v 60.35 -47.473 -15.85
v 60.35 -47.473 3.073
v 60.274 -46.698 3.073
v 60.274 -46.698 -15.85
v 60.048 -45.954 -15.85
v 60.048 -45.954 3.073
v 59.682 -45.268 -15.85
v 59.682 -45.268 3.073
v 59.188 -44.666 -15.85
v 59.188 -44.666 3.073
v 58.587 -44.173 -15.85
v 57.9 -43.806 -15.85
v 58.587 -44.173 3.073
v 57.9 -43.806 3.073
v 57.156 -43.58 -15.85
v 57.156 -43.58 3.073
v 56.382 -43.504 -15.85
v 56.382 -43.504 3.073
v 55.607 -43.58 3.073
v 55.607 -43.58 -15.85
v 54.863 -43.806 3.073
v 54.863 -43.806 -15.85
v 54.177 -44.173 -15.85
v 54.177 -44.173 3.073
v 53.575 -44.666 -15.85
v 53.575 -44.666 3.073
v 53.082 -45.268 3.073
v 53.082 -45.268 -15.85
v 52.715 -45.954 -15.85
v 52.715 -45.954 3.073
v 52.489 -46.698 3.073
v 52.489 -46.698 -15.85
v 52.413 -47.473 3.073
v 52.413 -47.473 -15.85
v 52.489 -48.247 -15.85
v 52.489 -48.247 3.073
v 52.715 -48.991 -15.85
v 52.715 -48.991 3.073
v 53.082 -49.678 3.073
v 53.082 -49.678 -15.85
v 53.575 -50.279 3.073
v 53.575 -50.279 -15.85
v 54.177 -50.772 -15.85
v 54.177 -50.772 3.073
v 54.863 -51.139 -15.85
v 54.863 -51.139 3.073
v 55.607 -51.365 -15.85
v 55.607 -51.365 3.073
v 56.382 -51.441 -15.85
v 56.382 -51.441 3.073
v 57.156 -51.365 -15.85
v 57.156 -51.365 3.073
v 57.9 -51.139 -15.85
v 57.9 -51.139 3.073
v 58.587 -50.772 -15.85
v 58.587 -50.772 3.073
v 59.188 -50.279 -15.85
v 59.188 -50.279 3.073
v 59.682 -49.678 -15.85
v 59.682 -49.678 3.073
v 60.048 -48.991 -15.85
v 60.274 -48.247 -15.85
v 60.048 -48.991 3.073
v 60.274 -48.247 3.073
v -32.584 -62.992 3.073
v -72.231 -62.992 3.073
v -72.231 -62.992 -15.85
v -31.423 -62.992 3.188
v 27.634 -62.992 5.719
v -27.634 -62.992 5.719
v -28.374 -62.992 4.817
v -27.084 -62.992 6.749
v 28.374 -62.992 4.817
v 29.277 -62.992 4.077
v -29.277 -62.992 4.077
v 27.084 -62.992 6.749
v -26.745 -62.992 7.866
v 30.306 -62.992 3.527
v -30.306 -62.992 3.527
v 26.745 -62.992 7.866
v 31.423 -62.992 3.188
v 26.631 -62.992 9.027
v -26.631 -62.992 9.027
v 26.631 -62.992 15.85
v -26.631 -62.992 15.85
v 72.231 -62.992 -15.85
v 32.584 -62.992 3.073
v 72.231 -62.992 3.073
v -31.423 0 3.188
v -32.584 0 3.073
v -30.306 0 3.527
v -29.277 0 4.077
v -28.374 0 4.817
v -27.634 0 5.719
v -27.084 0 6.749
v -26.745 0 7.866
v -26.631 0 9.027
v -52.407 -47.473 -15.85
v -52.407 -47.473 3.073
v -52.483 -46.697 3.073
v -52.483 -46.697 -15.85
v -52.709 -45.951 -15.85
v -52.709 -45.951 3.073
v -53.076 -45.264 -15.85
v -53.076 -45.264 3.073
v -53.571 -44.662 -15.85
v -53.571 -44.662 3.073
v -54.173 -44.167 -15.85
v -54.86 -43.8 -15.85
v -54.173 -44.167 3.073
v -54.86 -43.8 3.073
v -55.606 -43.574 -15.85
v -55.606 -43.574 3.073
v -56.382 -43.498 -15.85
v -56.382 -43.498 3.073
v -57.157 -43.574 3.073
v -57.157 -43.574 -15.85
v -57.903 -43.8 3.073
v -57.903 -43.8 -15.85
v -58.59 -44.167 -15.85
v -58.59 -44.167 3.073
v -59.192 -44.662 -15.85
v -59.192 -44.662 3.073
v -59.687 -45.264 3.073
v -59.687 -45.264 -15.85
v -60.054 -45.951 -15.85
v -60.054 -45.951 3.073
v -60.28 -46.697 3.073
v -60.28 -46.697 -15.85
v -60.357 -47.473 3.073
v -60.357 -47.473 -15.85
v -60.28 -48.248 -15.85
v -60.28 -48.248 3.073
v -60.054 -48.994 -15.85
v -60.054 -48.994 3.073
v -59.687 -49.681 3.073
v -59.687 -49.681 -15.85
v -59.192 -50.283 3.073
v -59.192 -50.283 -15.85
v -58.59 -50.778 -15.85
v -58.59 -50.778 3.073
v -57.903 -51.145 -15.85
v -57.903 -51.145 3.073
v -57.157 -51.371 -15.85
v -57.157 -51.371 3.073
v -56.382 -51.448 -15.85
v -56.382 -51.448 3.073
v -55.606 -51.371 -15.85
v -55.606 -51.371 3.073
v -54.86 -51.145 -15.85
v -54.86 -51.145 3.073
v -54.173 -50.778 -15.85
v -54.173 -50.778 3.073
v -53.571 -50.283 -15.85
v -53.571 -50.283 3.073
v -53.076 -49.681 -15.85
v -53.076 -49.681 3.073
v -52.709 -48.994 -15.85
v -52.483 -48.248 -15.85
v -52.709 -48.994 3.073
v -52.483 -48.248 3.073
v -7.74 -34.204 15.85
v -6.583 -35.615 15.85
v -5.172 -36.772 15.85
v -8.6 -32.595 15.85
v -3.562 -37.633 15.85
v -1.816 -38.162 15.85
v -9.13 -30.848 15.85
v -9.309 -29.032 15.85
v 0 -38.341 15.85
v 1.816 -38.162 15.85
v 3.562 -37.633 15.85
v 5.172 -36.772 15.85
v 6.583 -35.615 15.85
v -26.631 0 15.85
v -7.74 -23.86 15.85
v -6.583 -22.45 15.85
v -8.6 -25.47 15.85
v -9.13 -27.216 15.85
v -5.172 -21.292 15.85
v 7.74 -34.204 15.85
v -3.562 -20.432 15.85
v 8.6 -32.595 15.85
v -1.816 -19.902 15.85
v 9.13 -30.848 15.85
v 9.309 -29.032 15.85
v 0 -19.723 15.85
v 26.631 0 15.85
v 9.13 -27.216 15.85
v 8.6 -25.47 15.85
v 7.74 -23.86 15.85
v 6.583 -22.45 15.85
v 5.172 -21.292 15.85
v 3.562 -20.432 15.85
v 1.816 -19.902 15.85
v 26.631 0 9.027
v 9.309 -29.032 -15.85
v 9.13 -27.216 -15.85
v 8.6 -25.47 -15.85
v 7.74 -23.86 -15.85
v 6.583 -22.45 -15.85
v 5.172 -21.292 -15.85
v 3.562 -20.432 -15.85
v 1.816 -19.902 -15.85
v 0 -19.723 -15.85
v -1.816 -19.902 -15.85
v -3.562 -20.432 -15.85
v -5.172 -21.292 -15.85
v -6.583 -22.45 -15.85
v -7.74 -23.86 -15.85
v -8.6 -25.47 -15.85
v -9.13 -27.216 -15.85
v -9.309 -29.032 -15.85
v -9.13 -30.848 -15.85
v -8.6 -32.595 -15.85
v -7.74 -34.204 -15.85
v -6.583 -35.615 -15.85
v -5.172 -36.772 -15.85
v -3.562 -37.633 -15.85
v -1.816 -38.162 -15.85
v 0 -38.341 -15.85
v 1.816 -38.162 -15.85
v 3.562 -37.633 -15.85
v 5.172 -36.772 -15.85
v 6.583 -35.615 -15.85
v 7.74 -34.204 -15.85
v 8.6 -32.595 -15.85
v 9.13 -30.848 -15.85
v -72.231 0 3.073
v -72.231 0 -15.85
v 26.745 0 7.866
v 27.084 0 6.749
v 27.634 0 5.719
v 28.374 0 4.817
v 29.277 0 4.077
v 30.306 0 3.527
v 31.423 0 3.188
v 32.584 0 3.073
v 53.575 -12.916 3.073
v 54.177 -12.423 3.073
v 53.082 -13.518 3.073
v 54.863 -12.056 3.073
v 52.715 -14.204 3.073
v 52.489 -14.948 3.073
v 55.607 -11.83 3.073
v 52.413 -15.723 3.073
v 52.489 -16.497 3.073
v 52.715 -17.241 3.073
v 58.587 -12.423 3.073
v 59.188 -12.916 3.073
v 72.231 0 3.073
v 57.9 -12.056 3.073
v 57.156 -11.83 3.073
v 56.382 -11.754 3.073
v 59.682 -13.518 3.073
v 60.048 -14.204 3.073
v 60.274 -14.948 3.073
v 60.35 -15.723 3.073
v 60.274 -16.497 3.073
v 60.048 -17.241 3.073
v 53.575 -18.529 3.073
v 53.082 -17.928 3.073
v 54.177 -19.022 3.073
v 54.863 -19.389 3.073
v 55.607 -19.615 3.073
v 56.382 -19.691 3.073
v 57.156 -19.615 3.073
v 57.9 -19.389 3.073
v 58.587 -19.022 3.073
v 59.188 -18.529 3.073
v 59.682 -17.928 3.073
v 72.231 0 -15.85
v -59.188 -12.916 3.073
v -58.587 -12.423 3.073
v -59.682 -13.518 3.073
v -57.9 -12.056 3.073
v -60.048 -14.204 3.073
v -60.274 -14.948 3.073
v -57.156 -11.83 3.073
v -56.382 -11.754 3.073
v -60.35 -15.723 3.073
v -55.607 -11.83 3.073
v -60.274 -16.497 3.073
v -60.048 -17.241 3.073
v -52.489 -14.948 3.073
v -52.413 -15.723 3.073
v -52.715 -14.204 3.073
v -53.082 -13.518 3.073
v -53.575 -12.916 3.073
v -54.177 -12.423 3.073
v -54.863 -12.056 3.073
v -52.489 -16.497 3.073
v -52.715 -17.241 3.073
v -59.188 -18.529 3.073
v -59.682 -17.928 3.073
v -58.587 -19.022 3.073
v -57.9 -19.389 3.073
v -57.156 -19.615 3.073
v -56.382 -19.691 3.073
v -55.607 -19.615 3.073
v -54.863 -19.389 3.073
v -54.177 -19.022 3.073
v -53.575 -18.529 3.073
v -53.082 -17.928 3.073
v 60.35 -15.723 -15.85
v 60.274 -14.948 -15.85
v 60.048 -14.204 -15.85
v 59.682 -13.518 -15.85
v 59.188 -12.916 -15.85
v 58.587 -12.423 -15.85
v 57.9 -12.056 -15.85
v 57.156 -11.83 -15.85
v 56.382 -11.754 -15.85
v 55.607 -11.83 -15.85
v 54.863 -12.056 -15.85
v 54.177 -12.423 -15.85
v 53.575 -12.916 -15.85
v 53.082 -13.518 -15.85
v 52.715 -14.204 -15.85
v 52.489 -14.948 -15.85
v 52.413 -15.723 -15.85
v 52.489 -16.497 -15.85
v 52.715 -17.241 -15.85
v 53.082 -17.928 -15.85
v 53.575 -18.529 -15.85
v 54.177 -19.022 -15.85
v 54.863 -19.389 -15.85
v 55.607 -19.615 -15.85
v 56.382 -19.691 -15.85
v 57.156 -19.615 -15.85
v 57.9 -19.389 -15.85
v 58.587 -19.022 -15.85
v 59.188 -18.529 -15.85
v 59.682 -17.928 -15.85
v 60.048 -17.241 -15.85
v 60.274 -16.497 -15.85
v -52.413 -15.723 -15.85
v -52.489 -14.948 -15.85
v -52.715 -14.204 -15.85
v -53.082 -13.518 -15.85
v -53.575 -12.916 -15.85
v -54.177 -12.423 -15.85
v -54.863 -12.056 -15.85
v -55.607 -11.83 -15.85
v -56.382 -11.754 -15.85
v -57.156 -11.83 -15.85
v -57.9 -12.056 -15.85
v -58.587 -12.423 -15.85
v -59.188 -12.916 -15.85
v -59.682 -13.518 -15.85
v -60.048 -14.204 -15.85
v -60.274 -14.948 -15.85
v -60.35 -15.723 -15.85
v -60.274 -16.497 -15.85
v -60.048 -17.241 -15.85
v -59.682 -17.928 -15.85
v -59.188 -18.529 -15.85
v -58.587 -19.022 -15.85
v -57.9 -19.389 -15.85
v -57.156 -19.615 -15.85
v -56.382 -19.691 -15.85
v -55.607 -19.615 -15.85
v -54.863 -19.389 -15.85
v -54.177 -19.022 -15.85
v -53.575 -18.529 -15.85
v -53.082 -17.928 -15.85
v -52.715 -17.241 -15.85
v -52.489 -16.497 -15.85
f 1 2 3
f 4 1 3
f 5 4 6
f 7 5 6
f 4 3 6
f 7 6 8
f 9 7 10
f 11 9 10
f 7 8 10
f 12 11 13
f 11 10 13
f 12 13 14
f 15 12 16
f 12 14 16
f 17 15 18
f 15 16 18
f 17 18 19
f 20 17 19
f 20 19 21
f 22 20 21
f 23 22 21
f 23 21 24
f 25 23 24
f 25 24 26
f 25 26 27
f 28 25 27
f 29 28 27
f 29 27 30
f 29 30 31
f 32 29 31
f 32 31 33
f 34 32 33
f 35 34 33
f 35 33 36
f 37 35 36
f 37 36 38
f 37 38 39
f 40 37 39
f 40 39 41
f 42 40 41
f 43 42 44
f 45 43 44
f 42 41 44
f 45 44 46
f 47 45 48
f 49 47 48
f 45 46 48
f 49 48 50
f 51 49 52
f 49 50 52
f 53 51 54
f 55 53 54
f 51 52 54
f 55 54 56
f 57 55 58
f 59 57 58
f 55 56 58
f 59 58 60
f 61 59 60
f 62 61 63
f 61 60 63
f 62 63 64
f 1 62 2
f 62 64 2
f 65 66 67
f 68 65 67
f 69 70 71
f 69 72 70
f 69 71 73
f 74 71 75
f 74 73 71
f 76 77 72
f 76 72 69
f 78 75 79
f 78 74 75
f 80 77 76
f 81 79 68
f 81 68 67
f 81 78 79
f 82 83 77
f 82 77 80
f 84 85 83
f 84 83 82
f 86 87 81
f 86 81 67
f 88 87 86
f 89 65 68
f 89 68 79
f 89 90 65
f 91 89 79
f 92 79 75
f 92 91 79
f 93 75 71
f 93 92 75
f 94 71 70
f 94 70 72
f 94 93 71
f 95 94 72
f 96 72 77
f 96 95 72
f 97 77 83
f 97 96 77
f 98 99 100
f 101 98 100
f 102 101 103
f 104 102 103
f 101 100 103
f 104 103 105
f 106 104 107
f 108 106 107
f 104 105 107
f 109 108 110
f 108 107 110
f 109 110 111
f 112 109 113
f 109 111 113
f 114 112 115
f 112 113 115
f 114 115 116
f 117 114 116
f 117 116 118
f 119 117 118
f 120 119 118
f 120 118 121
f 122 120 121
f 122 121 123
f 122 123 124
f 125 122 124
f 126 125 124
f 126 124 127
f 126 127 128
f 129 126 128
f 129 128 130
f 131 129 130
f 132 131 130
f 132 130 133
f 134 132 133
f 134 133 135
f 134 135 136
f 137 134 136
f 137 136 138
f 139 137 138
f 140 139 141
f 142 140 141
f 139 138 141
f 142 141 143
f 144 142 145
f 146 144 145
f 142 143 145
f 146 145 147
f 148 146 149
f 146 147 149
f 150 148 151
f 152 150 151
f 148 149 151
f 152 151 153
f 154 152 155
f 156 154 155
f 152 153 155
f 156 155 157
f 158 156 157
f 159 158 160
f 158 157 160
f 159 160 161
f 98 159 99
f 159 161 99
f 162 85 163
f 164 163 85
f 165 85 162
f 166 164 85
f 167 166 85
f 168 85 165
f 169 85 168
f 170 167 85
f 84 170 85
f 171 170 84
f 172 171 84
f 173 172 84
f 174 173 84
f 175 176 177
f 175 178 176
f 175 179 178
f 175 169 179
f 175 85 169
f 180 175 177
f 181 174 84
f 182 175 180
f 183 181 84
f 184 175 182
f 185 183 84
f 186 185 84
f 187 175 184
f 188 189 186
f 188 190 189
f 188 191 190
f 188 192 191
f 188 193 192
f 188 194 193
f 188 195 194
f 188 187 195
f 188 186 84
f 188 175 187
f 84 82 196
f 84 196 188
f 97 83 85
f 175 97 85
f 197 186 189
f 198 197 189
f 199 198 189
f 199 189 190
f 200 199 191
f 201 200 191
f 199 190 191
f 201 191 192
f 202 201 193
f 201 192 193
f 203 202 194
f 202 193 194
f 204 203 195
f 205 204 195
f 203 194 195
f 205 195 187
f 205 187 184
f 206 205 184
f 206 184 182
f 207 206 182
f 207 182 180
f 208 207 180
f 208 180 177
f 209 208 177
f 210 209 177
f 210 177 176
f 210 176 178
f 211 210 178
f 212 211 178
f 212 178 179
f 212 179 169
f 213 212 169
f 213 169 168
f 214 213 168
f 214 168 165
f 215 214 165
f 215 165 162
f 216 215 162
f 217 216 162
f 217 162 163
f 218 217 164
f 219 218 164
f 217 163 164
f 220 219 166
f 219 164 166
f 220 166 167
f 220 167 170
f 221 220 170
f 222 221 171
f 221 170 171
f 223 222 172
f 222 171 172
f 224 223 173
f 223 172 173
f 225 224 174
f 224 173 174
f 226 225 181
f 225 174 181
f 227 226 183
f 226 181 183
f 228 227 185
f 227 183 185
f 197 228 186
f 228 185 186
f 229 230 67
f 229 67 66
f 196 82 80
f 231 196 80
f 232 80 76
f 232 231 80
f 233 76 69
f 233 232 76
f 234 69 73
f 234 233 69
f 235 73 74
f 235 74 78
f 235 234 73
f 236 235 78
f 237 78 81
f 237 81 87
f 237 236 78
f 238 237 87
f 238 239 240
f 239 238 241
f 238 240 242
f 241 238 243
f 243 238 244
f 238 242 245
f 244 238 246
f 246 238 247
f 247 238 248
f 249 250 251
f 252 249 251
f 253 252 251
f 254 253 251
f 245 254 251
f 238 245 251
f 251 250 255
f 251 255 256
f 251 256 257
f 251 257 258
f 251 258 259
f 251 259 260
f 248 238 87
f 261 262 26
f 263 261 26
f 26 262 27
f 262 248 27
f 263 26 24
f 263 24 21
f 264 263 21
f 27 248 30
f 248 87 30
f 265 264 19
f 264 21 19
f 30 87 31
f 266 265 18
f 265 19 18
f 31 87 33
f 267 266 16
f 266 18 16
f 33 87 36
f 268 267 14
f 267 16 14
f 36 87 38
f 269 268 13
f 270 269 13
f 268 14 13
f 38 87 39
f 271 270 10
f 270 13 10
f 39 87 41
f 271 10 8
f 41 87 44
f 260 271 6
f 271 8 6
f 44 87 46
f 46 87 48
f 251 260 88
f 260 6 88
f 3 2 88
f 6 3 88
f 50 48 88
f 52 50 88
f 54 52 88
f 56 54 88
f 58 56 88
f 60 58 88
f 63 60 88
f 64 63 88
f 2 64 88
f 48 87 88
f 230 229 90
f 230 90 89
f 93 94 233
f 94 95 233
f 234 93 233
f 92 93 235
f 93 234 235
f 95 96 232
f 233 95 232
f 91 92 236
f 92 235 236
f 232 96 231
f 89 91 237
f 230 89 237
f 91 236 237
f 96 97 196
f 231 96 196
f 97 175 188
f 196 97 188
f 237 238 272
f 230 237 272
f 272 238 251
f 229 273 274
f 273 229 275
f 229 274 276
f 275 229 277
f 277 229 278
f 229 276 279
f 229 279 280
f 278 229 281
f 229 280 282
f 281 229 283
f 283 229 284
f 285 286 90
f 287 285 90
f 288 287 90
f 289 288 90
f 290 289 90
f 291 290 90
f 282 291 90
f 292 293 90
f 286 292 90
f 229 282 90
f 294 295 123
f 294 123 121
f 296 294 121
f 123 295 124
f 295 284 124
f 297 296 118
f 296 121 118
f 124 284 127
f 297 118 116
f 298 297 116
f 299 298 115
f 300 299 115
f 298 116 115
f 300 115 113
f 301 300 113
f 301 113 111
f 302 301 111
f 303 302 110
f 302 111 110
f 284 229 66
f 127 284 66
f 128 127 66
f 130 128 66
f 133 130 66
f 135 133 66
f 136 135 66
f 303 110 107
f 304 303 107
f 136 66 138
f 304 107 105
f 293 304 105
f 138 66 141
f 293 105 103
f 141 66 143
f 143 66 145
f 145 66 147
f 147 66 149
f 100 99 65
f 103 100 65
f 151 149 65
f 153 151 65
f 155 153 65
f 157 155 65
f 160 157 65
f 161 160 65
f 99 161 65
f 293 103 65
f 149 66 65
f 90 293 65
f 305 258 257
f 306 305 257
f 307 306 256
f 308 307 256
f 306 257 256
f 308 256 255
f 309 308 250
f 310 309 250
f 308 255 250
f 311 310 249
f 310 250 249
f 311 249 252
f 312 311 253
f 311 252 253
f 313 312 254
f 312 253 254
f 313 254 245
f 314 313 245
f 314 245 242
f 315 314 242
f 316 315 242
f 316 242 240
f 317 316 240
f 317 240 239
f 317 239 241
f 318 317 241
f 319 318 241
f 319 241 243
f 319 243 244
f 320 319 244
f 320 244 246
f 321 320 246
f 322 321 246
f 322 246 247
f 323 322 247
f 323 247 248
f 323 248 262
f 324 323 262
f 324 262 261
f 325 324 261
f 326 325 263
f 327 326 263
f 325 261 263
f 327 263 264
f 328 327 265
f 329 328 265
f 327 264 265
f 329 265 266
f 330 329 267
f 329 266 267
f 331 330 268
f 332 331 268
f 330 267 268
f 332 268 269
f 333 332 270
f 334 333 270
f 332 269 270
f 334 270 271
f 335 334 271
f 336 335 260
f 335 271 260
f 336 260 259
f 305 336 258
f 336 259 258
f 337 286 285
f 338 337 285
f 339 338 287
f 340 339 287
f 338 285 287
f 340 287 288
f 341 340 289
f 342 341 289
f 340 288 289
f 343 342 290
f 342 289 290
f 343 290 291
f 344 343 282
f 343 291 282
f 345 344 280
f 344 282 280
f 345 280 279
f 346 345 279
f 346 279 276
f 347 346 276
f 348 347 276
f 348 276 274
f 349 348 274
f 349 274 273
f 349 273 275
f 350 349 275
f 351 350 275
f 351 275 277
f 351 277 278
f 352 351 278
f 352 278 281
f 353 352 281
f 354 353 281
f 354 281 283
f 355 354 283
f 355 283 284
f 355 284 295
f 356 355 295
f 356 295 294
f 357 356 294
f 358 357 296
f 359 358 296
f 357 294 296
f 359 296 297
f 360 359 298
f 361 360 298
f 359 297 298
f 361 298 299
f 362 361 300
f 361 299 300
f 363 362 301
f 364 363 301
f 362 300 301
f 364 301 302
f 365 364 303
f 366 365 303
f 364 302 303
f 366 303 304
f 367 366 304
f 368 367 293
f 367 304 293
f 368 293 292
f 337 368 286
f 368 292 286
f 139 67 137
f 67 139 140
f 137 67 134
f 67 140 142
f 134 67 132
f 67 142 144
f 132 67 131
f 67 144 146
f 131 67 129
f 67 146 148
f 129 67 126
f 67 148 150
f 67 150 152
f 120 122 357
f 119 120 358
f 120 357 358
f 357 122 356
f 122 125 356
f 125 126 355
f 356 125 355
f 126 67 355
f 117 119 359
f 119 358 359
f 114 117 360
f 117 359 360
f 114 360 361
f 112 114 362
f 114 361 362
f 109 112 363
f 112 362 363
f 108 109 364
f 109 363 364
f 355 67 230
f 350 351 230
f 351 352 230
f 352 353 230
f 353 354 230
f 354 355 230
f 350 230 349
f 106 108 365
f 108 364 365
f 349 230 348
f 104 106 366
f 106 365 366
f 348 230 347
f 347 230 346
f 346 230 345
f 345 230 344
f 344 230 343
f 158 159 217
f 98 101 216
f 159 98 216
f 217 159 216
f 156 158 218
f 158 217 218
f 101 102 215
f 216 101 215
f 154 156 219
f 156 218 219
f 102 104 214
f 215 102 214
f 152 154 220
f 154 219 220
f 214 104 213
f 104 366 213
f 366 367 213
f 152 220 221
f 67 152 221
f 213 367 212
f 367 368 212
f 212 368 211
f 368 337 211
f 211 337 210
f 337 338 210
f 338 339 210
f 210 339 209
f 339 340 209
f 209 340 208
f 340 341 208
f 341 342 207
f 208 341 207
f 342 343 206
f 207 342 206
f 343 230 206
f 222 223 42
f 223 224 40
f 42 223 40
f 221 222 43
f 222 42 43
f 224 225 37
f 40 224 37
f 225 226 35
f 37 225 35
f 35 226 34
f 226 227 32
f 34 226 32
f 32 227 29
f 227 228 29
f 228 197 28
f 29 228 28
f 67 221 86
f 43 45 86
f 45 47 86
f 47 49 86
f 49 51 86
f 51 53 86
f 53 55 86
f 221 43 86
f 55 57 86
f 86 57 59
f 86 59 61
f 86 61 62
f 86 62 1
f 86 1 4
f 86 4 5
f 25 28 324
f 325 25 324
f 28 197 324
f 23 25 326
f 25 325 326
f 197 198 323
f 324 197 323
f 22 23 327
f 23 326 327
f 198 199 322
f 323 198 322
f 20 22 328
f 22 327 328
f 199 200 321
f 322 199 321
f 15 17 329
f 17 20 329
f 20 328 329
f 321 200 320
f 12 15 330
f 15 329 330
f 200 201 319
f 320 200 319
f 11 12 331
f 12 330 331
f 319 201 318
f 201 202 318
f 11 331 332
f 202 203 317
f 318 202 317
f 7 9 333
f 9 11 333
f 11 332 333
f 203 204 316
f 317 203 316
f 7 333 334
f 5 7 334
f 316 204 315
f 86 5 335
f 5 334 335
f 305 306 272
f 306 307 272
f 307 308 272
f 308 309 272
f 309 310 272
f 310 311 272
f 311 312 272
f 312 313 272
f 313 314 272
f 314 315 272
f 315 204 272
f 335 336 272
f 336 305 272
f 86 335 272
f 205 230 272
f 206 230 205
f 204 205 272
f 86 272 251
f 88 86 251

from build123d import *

# Parameters (mm, degrees)
F0_W      = 144.4625
F0_H      = 31.6992
F1_DEPTH  = 62.992
F2_W      = 45.60062
F2_H      = 12.7762
F3_DEPTH  = 62.993
F4_R      = 5.95376
F5_R      = 9.3091
F6_DEPTH  = 31.7002
F7_R      = 3.96875
F7_R_2    = 3.9751
F8_DEPTH  = 18.924
F9_R      = 3.96875
F10_DEPTH = 18.924


with BuildPart() as f1:
    # F0 (on Front) → F1 (new body)
    with BuildSketch(Plane.XZ):
        Rectangle(F0_W, F0_H)
    extrude(amount=F1_DEPTH)

    # F2 (on face) → F3 (cut, through all)
    with BuildSketch(Plane.XZ.offset(62.992)):
        with Locations((-49.43094, 9.4615)):
            Rectangle(F2_W, F2_H)
        with Locations((49.43094, 9.4615)):
            Rectangle(F2_W, F2_H)
    extrude(amount=-F3_DEPTH, mode=Mode.SUBTRACT)

    # F4
    f4_edges = [f1.edges().sort_by_distance(p)[0] for p in [
        (-26.63063, -31.496, 3.0734),
        (26.63063, -31.496, 3.0734),
    ]]
    fillet(f4_edges, radius=F4_R)

    # F5 (on face) → F6 (cut, through all)
    with BuildSketch(Plane.XY.offset(15.8496)):
        with Locations((0, -29.0322)):
            Circle(F5_R)
    extrude(amount=-F6_DEPTH, mode=Mode.SUBTRACT)

    # F7 (on face) → F8 (cut, through all)
    with BuildSketch(Plane.XY.offset(3.0734)):
        with Locations((-56.38165, -15.7226)):
            Circle(F7_R)
        with Locations((-56.38165, -47.4726)):
            Circle(F7_R_2)
    extrude(amount=-F8_DEPTH, mode=Mode.SUBTRACT)

    # F9 (on face) → F10 (cut, through all)
    with BuildSketch(Plane.XY.offset(3.0734)):
        with Locations((56.38165, -15.7226)):
            Circle(F9_R)
        with Locations((56.38165, -47.4726)):
            Circle(F9_R)
    extrude(amount=-F10_DEPTH, mode=Mode.SUBTRACT)


solid = f1.part
